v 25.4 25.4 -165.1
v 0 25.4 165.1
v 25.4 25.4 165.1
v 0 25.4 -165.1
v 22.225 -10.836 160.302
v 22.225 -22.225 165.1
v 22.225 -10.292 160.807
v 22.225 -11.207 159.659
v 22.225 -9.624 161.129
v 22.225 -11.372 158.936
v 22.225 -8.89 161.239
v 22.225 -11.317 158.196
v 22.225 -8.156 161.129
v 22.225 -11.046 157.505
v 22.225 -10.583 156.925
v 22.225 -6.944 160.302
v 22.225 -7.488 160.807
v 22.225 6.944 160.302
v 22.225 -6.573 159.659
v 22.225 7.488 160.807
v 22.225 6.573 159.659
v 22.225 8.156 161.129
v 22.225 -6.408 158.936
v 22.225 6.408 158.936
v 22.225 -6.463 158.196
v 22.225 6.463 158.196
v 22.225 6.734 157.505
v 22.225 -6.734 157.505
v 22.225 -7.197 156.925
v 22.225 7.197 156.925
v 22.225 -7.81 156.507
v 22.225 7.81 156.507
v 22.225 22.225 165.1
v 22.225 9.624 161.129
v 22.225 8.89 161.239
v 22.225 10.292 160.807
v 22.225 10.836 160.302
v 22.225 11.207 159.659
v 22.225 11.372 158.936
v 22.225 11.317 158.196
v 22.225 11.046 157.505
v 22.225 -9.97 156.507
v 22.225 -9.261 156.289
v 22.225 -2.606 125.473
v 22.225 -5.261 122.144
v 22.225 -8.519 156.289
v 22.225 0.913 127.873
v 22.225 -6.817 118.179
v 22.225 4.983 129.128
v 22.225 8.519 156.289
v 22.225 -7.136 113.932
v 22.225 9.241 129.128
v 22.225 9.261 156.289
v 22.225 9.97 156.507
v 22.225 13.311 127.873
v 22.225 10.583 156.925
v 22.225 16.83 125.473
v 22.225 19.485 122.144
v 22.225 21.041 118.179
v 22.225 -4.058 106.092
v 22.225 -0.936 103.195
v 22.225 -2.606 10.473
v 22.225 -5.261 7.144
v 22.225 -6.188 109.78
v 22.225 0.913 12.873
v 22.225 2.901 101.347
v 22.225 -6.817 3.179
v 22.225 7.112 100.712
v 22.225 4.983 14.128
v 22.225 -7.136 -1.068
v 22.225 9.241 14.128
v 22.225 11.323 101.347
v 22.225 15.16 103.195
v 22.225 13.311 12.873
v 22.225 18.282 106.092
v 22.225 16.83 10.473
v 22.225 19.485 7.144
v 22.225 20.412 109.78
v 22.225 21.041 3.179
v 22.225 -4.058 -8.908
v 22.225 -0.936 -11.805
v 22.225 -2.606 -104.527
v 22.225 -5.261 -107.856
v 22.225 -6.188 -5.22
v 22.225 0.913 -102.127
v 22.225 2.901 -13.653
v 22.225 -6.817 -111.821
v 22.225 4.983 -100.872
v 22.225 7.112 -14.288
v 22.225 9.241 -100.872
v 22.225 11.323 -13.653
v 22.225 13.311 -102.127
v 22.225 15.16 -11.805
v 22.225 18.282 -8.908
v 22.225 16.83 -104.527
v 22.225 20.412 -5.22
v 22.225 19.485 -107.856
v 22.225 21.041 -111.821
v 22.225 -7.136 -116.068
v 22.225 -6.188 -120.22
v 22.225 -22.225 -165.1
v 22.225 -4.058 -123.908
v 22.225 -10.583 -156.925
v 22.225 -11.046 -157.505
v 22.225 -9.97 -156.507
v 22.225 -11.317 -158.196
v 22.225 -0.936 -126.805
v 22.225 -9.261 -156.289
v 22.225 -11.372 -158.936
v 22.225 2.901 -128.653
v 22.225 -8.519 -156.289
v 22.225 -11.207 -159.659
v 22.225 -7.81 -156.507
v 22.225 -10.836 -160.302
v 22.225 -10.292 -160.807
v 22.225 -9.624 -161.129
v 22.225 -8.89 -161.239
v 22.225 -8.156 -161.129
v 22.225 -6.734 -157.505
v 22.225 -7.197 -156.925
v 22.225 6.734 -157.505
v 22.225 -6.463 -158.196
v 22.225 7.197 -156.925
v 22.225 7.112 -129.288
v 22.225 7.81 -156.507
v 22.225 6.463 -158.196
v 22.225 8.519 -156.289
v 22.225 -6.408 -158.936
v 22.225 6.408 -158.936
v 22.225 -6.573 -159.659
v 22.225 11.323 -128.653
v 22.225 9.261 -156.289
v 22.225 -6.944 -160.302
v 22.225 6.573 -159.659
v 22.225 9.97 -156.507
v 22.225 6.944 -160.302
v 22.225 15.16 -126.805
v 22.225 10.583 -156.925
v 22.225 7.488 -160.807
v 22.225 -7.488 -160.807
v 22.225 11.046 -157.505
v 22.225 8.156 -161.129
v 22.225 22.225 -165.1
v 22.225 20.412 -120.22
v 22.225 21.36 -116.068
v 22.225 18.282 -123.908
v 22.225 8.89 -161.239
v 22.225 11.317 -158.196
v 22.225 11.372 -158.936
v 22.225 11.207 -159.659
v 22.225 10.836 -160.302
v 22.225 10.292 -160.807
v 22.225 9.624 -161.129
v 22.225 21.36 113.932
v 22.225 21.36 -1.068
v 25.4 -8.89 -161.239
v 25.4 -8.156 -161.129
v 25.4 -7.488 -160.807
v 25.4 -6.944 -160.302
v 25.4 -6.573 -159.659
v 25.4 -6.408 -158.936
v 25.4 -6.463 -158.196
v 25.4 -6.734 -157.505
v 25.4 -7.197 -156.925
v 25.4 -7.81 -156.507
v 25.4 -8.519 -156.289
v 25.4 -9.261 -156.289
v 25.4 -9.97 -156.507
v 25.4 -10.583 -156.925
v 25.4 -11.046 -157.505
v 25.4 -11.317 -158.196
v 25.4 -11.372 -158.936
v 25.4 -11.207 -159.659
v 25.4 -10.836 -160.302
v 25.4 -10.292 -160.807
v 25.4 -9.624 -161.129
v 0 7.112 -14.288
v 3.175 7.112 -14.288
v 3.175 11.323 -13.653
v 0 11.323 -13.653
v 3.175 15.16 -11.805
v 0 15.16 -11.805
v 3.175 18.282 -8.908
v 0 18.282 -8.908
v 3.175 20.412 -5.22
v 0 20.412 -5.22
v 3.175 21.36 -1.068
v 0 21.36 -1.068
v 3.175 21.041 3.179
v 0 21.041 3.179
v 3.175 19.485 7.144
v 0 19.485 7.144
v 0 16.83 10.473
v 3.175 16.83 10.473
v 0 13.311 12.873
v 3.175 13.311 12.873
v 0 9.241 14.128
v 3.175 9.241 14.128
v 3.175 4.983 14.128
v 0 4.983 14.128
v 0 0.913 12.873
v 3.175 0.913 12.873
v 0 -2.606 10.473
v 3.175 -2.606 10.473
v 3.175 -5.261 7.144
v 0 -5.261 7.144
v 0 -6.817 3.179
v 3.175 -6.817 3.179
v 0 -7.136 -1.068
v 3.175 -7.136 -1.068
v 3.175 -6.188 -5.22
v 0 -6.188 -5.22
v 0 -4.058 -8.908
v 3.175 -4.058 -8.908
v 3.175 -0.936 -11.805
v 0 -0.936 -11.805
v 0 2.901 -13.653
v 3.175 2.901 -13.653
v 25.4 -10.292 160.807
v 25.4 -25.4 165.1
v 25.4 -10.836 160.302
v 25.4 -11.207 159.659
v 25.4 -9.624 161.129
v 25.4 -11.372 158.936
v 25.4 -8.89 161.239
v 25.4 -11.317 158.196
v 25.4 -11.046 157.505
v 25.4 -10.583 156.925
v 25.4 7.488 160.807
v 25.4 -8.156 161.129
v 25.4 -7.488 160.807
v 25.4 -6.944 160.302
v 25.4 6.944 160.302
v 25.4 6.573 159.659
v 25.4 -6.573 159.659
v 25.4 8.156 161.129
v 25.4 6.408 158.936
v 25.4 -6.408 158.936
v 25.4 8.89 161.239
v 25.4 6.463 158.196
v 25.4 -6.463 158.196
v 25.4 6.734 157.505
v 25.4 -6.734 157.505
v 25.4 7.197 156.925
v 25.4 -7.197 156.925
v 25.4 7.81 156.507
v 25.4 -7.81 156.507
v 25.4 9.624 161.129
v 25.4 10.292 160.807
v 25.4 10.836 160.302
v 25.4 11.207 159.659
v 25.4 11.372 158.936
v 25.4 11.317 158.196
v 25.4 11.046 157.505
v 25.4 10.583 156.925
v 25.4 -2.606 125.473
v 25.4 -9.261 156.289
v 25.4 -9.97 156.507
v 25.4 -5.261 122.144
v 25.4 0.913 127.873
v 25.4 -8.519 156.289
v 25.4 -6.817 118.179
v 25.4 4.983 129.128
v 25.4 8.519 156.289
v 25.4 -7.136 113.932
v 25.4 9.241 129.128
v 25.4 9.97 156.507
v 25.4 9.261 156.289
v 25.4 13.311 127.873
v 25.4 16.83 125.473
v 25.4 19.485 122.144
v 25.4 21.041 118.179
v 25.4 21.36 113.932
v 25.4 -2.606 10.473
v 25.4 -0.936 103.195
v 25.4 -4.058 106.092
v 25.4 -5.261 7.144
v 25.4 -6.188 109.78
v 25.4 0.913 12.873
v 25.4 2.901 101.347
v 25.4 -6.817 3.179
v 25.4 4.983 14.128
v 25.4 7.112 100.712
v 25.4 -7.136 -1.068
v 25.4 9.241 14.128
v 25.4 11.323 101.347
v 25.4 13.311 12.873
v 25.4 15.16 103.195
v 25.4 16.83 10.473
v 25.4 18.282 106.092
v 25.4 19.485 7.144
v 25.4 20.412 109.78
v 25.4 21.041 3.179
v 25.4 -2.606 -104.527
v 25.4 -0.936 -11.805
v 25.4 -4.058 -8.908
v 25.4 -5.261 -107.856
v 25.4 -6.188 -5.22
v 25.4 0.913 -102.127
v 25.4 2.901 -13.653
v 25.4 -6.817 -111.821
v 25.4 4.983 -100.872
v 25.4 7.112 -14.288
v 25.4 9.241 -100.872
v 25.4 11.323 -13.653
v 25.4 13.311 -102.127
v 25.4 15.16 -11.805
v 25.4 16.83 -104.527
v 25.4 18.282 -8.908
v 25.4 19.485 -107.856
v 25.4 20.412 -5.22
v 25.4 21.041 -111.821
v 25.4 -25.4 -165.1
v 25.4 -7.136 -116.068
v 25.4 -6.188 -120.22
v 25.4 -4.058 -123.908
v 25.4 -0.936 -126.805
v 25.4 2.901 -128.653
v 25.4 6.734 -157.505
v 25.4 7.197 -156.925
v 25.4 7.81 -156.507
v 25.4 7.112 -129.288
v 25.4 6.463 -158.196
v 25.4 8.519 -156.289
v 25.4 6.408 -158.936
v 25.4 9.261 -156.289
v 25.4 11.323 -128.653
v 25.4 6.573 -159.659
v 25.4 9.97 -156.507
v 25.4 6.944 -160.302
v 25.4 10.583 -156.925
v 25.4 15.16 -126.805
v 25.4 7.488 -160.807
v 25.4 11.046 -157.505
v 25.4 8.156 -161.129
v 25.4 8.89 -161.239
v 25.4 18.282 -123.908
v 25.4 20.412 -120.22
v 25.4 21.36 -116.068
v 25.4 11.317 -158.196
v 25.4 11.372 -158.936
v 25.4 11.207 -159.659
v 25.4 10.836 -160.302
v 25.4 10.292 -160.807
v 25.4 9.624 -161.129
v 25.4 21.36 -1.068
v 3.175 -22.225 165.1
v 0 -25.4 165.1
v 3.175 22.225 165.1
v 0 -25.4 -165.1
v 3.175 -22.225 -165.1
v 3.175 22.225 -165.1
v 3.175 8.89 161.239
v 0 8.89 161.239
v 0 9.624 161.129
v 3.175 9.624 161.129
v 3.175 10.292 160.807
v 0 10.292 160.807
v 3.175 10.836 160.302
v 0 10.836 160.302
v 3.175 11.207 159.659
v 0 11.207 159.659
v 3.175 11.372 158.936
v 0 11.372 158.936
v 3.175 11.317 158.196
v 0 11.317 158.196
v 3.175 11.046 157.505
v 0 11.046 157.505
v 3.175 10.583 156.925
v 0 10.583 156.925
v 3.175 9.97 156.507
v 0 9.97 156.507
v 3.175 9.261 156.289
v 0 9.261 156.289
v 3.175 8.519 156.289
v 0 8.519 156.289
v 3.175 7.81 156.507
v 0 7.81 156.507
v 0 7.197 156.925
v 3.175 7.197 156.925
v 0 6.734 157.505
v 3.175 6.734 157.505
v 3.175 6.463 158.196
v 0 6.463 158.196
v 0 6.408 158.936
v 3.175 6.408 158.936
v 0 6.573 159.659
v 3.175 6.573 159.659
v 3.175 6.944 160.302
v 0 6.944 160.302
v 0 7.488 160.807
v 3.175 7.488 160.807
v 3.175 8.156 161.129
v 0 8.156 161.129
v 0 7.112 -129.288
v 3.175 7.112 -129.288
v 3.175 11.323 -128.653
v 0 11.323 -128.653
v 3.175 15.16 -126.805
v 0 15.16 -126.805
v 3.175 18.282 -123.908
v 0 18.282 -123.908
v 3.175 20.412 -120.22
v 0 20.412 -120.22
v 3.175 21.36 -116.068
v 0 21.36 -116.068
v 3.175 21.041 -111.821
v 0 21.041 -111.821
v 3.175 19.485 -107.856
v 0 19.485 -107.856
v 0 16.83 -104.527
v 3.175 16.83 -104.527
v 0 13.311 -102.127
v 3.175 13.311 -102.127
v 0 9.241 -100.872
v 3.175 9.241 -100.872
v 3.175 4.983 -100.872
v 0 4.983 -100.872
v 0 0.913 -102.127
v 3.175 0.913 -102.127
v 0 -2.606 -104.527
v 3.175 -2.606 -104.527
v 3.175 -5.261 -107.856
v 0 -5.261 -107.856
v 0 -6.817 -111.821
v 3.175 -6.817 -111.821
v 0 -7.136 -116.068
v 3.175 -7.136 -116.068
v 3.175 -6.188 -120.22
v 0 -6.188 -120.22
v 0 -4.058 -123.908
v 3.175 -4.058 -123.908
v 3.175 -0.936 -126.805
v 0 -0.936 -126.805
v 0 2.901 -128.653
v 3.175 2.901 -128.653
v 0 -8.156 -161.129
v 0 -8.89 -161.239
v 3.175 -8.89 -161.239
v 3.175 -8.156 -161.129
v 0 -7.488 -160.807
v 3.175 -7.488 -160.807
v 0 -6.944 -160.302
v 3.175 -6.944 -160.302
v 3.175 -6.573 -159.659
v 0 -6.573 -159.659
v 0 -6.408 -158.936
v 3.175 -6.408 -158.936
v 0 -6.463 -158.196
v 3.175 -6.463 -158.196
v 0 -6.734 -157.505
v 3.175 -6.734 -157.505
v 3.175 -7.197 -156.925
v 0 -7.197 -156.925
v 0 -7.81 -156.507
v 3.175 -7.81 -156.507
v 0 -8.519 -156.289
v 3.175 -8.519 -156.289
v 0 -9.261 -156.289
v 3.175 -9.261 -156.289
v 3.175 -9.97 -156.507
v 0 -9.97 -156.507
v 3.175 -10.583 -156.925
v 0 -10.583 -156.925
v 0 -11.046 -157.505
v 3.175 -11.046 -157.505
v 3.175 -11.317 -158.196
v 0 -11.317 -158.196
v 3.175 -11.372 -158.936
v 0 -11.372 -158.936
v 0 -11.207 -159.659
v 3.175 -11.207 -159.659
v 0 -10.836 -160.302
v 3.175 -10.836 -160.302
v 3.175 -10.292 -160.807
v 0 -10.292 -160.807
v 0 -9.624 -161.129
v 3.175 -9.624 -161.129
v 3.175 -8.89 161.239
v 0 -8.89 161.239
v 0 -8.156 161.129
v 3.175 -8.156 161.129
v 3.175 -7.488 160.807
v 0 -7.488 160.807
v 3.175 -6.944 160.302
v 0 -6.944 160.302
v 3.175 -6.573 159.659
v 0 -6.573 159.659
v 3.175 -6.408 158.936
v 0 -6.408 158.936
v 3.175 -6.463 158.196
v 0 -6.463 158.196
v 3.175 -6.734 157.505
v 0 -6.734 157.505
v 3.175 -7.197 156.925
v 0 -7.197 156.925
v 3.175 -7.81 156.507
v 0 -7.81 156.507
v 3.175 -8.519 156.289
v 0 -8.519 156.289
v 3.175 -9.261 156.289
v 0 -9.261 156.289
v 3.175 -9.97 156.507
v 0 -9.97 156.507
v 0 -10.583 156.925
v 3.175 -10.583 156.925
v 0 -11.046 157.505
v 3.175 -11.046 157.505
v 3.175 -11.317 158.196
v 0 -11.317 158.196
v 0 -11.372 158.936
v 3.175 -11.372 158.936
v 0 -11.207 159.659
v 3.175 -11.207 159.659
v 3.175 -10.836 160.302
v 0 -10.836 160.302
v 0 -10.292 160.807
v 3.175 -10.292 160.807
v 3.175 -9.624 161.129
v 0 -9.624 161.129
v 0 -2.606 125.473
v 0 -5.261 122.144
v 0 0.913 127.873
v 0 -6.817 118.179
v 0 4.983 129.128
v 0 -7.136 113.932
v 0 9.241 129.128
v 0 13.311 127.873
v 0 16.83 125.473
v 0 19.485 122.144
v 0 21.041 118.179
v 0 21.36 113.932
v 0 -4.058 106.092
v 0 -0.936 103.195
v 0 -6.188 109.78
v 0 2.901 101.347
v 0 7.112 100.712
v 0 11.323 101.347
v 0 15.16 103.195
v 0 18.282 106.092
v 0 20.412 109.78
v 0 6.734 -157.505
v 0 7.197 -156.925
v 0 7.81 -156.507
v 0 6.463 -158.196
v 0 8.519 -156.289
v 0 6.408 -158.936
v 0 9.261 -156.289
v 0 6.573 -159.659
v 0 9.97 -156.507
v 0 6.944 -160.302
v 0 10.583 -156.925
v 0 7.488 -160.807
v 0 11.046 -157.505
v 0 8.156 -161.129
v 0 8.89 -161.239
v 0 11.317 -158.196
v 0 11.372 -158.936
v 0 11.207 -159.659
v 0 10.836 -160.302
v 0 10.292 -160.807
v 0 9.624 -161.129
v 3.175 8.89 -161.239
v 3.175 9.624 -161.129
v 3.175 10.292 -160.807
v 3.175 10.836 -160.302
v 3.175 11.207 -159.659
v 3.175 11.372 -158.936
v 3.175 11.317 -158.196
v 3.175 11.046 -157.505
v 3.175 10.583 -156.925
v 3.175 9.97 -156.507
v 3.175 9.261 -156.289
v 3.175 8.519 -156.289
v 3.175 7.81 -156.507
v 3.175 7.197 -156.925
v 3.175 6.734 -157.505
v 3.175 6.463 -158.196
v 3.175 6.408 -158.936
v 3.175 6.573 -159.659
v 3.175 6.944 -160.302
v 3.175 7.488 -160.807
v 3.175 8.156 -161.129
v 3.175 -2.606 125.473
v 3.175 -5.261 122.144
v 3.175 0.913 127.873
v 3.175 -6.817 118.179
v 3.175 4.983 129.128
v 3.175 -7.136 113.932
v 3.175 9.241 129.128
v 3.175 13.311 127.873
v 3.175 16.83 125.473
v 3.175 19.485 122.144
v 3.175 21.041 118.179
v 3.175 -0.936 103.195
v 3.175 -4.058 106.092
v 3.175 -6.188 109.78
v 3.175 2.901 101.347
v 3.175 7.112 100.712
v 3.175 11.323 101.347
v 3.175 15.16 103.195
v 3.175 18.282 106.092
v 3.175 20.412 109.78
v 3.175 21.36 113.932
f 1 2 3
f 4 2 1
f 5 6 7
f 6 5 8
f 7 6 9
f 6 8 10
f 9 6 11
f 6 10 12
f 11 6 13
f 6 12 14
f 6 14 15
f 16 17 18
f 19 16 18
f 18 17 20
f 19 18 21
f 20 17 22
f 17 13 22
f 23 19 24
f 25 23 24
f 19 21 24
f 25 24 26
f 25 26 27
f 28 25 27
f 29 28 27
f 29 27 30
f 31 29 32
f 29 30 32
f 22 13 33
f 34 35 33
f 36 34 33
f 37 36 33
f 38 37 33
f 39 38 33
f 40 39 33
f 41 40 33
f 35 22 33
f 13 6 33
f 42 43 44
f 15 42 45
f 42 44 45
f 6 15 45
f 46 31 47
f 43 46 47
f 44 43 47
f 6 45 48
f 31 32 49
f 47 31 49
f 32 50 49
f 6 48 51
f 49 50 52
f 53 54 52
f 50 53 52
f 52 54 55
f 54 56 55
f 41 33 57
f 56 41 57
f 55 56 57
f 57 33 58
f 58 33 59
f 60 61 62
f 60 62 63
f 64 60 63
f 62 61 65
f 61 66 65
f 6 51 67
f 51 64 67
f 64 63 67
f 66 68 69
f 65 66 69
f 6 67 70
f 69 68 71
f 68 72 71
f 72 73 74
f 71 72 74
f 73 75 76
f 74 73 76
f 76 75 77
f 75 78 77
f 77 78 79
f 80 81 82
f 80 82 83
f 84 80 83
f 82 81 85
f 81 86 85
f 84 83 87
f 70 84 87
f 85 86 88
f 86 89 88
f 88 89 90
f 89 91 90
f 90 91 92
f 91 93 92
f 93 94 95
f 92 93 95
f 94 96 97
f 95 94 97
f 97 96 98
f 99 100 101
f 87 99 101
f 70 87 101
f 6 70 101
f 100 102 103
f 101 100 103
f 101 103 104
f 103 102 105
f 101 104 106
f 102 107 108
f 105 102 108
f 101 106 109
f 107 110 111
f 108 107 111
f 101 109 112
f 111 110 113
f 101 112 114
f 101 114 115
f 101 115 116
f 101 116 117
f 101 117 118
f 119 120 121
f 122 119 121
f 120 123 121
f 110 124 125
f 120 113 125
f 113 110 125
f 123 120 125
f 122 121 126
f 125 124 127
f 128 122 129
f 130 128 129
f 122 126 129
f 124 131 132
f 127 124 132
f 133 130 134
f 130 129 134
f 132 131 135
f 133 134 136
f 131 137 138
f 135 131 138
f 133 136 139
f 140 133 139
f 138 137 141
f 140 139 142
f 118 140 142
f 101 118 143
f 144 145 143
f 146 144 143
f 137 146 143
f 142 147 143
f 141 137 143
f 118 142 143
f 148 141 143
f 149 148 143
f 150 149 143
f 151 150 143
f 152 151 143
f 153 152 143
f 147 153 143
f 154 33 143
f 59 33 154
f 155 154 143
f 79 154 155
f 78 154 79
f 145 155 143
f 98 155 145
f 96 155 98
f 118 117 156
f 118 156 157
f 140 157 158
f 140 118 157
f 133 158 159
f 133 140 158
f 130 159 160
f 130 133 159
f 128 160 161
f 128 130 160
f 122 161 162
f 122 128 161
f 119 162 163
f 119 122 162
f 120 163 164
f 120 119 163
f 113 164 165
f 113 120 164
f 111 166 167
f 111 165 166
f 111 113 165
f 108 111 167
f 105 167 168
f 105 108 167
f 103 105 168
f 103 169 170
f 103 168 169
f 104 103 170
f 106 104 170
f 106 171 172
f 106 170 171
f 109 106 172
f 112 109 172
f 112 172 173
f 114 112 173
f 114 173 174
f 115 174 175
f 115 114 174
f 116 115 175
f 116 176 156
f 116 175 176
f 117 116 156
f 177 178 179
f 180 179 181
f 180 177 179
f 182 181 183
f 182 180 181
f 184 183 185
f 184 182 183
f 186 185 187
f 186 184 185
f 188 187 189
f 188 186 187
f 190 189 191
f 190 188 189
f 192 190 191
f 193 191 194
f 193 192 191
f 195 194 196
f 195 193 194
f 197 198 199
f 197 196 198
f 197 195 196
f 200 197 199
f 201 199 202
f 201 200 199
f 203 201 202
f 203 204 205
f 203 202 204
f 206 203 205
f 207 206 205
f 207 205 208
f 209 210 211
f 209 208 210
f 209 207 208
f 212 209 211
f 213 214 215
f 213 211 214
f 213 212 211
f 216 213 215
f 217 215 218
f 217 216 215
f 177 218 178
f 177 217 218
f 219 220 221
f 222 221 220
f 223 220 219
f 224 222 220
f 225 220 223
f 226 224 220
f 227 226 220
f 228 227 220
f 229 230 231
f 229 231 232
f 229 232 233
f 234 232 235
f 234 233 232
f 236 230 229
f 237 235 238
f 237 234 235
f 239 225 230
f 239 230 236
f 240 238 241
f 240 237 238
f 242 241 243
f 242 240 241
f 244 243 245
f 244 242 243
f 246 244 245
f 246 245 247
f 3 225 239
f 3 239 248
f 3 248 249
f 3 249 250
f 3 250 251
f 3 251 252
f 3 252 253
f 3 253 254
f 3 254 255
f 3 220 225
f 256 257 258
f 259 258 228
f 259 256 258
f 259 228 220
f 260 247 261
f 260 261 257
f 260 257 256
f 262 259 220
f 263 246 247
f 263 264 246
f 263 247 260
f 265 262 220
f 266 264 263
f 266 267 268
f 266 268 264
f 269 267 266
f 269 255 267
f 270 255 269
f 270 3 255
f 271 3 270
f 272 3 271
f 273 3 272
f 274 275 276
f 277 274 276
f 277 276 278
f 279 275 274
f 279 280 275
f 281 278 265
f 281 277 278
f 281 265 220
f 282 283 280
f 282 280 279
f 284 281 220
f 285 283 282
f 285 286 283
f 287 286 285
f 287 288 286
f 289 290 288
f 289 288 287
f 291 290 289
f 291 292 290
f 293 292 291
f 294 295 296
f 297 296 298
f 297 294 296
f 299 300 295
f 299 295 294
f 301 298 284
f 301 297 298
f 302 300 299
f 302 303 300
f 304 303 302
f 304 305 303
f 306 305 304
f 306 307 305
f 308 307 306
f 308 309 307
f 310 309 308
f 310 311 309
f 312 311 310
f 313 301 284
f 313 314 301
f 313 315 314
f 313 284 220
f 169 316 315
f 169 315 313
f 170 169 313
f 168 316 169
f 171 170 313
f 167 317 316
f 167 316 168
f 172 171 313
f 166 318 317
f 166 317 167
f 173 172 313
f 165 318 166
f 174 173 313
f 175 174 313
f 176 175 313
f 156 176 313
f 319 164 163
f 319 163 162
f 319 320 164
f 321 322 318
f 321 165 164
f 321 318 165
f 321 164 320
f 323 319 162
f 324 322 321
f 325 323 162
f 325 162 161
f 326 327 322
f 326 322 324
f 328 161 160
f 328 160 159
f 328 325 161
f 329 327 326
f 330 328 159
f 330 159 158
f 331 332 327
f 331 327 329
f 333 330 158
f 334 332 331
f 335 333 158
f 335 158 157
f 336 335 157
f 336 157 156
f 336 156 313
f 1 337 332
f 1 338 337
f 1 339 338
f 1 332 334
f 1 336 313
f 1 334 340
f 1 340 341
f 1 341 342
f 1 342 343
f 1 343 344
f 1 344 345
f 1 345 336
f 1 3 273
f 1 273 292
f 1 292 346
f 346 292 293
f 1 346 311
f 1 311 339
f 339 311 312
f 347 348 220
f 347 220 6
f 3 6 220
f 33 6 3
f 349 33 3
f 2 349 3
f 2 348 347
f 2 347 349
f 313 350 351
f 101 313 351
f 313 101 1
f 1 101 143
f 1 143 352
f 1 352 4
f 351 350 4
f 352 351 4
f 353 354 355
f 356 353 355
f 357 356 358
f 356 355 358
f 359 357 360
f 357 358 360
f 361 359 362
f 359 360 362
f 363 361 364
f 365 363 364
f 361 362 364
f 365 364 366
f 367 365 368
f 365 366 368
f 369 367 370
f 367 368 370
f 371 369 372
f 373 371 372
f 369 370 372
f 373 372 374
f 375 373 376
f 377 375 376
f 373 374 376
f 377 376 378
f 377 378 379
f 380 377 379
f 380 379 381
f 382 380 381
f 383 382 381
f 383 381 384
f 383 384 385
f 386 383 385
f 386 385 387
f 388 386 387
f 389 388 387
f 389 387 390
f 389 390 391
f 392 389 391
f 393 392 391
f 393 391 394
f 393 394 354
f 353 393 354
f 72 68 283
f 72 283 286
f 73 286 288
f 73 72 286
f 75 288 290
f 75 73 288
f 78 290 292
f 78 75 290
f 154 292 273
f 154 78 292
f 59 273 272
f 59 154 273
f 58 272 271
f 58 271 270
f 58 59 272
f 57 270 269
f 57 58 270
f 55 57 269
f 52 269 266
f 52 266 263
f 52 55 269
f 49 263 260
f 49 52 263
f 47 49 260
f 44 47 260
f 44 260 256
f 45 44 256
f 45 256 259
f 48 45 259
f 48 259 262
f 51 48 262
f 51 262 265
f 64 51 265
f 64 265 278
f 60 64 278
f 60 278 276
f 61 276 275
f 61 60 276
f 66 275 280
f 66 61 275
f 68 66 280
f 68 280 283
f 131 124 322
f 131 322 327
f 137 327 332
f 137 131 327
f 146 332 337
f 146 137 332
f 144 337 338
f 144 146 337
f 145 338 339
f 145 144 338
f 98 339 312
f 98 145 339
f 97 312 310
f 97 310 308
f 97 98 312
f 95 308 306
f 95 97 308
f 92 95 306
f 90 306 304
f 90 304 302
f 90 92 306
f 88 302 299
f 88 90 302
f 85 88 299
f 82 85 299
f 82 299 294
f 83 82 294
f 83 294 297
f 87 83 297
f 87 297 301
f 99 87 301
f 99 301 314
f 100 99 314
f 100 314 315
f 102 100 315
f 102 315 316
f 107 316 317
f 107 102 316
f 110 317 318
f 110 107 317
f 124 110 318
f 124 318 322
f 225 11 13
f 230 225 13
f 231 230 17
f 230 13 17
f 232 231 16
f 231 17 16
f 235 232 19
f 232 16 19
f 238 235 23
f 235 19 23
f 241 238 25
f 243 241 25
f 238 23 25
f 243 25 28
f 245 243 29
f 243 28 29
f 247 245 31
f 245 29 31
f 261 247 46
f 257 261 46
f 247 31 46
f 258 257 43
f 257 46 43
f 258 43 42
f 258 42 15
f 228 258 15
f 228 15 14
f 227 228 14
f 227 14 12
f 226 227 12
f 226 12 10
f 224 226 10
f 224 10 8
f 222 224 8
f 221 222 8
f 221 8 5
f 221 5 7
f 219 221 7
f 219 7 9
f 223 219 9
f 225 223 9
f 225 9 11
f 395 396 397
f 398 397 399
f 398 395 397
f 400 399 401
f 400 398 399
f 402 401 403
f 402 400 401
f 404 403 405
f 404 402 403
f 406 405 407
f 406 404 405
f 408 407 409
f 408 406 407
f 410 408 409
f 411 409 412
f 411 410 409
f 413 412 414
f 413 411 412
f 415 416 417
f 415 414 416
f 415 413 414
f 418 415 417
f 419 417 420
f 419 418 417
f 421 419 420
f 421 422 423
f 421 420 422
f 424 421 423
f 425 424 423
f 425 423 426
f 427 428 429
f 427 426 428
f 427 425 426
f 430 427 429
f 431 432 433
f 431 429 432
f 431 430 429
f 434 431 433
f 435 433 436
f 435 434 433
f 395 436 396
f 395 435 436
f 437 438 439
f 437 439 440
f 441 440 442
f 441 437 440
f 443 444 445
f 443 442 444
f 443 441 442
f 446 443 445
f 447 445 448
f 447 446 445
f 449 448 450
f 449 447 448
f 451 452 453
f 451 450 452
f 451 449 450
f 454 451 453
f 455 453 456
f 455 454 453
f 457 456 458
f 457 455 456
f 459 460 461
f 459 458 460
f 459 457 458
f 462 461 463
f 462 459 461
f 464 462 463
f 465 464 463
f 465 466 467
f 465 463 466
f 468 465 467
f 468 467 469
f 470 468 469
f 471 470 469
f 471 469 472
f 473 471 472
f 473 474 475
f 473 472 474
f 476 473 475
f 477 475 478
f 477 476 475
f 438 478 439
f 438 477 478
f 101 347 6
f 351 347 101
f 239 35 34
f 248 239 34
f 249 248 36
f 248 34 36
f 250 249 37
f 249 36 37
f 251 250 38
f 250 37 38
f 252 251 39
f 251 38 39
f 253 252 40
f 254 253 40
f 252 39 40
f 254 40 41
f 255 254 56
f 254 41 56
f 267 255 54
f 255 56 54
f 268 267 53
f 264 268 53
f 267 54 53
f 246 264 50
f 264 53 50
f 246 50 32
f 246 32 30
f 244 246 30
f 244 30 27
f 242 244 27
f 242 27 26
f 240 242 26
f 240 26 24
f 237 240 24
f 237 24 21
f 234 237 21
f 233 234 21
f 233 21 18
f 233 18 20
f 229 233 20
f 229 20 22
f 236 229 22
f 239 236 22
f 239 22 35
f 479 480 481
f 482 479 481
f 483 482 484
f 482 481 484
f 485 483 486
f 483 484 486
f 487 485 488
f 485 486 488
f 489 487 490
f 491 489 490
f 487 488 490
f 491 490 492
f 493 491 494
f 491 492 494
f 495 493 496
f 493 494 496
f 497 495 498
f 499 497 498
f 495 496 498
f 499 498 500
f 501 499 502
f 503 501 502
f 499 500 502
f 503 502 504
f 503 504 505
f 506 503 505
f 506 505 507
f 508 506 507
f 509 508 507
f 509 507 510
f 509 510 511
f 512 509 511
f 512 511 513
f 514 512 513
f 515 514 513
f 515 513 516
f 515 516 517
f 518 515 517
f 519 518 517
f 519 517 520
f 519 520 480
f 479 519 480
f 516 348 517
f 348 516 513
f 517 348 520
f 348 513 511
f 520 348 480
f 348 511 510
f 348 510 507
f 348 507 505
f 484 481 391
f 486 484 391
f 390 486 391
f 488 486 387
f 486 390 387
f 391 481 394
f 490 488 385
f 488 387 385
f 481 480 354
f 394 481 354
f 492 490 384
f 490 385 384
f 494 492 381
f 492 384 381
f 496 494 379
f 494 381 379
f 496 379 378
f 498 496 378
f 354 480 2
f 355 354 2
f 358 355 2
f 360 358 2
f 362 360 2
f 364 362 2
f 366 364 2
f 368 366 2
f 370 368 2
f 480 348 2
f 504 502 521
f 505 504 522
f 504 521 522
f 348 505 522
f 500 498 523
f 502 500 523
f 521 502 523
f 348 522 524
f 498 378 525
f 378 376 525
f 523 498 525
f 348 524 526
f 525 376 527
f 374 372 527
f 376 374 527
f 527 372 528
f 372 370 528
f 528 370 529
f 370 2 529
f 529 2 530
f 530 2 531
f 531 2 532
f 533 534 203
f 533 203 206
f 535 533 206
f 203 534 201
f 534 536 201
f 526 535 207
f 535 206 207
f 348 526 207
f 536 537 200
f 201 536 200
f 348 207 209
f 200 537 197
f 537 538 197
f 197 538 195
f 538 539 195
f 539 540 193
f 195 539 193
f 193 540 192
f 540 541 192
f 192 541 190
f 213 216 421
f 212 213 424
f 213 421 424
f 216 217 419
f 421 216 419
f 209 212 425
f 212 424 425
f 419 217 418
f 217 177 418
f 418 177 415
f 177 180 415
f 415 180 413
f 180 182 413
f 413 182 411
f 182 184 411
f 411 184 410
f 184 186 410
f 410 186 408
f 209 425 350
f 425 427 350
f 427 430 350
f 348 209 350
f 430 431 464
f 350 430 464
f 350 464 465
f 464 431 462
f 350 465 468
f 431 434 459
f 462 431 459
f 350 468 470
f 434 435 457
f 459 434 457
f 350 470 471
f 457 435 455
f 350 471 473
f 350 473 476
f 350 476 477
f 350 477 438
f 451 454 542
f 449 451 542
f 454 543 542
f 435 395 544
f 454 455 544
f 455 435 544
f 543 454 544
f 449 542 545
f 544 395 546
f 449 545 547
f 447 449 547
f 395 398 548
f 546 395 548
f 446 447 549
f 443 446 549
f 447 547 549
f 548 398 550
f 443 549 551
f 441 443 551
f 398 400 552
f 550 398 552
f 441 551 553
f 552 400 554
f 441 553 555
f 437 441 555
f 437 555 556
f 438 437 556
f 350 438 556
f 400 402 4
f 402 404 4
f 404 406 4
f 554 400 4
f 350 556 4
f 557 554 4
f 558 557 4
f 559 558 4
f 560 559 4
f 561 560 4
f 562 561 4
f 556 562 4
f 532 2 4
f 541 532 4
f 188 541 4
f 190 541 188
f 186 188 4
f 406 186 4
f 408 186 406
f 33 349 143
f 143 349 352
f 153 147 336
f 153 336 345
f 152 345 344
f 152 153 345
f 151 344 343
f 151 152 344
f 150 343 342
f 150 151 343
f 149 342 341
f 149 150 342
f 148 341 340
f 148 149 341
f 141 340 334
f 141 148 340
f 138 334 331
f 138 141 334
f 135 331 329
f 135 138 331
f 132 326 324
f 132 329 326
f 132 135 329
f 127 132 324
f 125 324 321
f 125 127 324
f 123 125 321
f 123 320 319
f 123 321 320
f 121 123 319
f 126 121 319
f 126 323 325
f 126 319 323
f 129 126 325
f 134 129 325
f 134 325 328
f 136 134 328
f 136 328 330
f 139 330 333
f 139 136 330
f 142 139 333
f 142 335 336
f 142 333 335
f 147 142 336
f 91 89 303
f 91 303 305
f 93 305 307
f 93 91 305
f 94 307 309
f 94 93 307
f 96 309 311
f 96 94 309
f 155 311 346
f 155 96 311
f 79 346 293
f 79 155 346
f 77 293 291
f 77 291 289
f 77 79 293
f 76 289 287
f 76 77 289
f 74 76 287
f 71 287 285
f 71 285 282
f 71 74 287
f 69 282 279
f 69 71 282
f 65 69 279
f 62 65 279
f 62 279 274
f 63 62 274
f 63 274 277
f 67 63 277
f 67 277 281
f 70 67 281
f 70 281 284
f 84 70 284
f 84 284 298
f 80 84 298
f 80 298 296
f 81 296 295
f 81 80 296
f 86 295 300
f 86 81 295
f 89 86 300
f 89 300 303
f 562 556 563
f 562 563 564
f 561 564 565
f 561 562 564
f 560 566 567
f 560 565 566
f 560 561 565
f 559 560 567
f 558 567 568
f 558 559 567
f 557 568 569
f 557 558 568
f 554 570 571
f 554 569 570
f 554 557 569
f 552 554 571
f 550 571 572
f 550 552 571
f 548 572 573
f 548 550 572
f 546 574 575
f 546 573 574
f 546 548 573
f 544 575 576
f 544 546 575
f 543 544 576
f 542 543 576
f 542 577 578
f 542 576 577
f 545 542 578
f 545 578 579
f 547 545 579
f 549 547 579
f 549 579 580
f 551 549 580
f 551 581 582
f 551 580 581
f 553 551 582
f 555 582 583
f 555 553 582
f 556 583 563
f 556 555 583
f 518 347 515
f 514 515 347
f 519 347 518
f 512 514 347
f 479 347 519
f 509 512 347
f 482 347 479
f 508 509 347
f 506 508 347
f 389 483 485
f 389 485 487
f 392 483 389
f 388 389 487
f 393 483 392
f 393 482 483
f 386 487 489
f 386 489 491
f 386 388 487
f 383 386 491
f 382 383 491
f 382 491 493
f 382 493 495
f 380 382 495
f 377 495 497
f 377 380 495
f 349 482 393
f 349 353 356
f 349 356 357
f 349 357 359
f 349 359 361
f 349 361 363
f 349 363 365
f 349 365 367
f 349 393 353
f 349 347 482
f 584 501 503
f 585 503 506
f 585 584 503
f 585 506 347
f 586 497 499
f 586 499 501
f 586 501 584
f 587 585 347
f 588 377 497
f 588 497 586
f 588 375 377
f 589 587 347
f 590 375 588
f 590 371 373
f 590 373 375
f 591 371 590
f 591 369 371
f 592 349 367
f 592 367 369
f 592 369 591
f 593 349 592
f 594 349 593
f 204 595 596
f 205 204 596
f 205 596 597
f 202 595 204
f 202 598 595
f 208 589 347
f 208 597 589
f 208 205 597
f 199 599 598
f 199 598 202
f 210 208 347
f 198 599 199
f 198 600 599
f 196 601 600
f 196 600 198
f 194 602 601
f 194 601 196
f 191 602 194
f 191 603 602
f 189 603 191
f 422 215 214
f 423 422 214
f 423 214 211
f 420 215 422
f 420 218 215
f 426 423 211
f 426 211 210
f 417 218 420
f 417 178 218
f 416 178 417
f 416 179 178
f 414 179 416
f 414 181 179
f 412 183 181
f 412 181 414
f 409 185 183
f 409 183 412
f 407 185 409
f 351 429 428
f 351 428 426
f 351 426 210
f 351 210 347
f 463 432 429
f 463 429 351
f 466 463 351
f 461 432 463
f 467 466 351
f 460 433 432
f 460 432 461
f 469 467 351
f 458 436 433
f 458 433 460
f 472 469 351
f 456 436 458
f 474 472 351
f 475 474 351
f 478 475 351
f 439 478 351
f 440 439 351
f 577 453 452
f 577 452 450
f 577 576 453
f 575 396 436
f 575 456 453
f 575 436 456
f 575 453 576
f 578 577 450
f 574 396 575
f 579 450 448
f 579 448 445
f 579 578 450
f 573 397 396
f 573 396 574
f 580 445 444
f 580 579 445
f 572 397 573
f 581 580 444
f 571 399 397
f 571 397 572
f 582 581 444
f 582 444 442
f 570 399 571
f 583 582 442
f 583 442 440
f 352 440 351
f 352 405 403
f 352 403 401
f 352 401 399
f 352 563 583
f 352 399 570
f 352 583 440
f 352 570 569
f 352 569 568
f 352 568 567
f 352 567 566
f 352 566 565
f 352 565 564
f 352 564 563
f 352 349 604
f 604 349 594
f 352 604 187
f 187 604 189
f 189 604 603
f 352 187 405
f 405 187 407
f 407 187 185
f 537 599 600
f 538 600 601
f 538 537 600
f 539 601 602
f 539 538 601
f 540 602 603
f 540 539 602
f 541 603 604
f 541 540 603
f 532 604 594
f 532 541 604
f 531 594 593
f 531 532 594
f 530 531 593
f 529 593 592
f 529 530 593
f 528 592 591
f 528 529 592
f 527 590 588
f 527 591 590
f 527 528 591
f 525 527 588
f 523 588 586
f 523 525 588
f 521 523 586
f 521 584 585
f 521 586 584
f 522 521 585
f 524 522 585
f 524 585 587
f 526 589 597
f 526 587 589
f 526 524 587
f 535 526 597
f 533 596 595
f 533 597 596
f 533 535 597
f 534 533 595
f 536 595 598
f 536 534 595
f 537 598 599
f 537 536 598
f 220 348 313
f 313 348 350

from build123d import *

# Parameters (mm, degrees)
SKETCH1_W                  = 330.2
SKETCH1_H                  = 50.8
SKETCH1_R                  = 14.2875
BOSS_EXTRUDE1_DEPTH        = 25.4
SHELL1_T                   = -3.175
F_9_0_196_DIAMETER_HOLE1_D = 4.9784


with BuildPart() as part:
    # Sketch1 → Boss-Extrude1 (new body)
    with BuildSketch(Plane(origin=(0, 0, 0), x_dir=(0, 0, -1), z_dir=(1, 0, 0))):
        Rectangle(SKETCH1_W, SKETCH1_H)
        with Locations((115, 7.112)):
            Circle(SKETCH1_R, mode=Mode.SUBTRACT)
        with Locations((-115, 7.112)):
            Circle(SKETCH1_R, mode=Mode.SUBTRACT)
        with Locations((0, 7.112)):
            Circle(SKETCH1_R, mode=Mode.SUBTRACT)
    extrude(amount=BOSS_EXTRUDE1_DEPTH)

    # Shell1
    shell1_openings = [part.faces().sort_by_distance(p)[0] for p in [
        (12.7, 0, -165.1),
        (12.7, 0, 165.1),
        (12.7, 7.112, 14.2875),
        (12.7, 7.112, 129.2875),
        (12.7, 7.112, -100.7125),
    ]]
    offset(amount=SHELL1_T, openings=shell1_openings, kind=Kind.INTERSECTION)

    # #9 (0.196) Diameter Hole1 (through all)
    with Locations(Plane(origin=(25.4, 0, 0), x_dir=(0, 0, -1), z_dir=(1, 0, 0))):
        with Locations((-158.75, 8.89), (-158.75, -8.89)):
            f_9_0_196_diameter_hole1 = Hole(F_9_0_196_DIAMETER_HOLE1_D / 2)

    # Mirror1: #9 (0.196) Diameter Hole1 across plane
    add(f_9_0_196_diameter_hole1.mirror(Plane.XY), mode=Mode.SUBTRACT)


solid = part.part
